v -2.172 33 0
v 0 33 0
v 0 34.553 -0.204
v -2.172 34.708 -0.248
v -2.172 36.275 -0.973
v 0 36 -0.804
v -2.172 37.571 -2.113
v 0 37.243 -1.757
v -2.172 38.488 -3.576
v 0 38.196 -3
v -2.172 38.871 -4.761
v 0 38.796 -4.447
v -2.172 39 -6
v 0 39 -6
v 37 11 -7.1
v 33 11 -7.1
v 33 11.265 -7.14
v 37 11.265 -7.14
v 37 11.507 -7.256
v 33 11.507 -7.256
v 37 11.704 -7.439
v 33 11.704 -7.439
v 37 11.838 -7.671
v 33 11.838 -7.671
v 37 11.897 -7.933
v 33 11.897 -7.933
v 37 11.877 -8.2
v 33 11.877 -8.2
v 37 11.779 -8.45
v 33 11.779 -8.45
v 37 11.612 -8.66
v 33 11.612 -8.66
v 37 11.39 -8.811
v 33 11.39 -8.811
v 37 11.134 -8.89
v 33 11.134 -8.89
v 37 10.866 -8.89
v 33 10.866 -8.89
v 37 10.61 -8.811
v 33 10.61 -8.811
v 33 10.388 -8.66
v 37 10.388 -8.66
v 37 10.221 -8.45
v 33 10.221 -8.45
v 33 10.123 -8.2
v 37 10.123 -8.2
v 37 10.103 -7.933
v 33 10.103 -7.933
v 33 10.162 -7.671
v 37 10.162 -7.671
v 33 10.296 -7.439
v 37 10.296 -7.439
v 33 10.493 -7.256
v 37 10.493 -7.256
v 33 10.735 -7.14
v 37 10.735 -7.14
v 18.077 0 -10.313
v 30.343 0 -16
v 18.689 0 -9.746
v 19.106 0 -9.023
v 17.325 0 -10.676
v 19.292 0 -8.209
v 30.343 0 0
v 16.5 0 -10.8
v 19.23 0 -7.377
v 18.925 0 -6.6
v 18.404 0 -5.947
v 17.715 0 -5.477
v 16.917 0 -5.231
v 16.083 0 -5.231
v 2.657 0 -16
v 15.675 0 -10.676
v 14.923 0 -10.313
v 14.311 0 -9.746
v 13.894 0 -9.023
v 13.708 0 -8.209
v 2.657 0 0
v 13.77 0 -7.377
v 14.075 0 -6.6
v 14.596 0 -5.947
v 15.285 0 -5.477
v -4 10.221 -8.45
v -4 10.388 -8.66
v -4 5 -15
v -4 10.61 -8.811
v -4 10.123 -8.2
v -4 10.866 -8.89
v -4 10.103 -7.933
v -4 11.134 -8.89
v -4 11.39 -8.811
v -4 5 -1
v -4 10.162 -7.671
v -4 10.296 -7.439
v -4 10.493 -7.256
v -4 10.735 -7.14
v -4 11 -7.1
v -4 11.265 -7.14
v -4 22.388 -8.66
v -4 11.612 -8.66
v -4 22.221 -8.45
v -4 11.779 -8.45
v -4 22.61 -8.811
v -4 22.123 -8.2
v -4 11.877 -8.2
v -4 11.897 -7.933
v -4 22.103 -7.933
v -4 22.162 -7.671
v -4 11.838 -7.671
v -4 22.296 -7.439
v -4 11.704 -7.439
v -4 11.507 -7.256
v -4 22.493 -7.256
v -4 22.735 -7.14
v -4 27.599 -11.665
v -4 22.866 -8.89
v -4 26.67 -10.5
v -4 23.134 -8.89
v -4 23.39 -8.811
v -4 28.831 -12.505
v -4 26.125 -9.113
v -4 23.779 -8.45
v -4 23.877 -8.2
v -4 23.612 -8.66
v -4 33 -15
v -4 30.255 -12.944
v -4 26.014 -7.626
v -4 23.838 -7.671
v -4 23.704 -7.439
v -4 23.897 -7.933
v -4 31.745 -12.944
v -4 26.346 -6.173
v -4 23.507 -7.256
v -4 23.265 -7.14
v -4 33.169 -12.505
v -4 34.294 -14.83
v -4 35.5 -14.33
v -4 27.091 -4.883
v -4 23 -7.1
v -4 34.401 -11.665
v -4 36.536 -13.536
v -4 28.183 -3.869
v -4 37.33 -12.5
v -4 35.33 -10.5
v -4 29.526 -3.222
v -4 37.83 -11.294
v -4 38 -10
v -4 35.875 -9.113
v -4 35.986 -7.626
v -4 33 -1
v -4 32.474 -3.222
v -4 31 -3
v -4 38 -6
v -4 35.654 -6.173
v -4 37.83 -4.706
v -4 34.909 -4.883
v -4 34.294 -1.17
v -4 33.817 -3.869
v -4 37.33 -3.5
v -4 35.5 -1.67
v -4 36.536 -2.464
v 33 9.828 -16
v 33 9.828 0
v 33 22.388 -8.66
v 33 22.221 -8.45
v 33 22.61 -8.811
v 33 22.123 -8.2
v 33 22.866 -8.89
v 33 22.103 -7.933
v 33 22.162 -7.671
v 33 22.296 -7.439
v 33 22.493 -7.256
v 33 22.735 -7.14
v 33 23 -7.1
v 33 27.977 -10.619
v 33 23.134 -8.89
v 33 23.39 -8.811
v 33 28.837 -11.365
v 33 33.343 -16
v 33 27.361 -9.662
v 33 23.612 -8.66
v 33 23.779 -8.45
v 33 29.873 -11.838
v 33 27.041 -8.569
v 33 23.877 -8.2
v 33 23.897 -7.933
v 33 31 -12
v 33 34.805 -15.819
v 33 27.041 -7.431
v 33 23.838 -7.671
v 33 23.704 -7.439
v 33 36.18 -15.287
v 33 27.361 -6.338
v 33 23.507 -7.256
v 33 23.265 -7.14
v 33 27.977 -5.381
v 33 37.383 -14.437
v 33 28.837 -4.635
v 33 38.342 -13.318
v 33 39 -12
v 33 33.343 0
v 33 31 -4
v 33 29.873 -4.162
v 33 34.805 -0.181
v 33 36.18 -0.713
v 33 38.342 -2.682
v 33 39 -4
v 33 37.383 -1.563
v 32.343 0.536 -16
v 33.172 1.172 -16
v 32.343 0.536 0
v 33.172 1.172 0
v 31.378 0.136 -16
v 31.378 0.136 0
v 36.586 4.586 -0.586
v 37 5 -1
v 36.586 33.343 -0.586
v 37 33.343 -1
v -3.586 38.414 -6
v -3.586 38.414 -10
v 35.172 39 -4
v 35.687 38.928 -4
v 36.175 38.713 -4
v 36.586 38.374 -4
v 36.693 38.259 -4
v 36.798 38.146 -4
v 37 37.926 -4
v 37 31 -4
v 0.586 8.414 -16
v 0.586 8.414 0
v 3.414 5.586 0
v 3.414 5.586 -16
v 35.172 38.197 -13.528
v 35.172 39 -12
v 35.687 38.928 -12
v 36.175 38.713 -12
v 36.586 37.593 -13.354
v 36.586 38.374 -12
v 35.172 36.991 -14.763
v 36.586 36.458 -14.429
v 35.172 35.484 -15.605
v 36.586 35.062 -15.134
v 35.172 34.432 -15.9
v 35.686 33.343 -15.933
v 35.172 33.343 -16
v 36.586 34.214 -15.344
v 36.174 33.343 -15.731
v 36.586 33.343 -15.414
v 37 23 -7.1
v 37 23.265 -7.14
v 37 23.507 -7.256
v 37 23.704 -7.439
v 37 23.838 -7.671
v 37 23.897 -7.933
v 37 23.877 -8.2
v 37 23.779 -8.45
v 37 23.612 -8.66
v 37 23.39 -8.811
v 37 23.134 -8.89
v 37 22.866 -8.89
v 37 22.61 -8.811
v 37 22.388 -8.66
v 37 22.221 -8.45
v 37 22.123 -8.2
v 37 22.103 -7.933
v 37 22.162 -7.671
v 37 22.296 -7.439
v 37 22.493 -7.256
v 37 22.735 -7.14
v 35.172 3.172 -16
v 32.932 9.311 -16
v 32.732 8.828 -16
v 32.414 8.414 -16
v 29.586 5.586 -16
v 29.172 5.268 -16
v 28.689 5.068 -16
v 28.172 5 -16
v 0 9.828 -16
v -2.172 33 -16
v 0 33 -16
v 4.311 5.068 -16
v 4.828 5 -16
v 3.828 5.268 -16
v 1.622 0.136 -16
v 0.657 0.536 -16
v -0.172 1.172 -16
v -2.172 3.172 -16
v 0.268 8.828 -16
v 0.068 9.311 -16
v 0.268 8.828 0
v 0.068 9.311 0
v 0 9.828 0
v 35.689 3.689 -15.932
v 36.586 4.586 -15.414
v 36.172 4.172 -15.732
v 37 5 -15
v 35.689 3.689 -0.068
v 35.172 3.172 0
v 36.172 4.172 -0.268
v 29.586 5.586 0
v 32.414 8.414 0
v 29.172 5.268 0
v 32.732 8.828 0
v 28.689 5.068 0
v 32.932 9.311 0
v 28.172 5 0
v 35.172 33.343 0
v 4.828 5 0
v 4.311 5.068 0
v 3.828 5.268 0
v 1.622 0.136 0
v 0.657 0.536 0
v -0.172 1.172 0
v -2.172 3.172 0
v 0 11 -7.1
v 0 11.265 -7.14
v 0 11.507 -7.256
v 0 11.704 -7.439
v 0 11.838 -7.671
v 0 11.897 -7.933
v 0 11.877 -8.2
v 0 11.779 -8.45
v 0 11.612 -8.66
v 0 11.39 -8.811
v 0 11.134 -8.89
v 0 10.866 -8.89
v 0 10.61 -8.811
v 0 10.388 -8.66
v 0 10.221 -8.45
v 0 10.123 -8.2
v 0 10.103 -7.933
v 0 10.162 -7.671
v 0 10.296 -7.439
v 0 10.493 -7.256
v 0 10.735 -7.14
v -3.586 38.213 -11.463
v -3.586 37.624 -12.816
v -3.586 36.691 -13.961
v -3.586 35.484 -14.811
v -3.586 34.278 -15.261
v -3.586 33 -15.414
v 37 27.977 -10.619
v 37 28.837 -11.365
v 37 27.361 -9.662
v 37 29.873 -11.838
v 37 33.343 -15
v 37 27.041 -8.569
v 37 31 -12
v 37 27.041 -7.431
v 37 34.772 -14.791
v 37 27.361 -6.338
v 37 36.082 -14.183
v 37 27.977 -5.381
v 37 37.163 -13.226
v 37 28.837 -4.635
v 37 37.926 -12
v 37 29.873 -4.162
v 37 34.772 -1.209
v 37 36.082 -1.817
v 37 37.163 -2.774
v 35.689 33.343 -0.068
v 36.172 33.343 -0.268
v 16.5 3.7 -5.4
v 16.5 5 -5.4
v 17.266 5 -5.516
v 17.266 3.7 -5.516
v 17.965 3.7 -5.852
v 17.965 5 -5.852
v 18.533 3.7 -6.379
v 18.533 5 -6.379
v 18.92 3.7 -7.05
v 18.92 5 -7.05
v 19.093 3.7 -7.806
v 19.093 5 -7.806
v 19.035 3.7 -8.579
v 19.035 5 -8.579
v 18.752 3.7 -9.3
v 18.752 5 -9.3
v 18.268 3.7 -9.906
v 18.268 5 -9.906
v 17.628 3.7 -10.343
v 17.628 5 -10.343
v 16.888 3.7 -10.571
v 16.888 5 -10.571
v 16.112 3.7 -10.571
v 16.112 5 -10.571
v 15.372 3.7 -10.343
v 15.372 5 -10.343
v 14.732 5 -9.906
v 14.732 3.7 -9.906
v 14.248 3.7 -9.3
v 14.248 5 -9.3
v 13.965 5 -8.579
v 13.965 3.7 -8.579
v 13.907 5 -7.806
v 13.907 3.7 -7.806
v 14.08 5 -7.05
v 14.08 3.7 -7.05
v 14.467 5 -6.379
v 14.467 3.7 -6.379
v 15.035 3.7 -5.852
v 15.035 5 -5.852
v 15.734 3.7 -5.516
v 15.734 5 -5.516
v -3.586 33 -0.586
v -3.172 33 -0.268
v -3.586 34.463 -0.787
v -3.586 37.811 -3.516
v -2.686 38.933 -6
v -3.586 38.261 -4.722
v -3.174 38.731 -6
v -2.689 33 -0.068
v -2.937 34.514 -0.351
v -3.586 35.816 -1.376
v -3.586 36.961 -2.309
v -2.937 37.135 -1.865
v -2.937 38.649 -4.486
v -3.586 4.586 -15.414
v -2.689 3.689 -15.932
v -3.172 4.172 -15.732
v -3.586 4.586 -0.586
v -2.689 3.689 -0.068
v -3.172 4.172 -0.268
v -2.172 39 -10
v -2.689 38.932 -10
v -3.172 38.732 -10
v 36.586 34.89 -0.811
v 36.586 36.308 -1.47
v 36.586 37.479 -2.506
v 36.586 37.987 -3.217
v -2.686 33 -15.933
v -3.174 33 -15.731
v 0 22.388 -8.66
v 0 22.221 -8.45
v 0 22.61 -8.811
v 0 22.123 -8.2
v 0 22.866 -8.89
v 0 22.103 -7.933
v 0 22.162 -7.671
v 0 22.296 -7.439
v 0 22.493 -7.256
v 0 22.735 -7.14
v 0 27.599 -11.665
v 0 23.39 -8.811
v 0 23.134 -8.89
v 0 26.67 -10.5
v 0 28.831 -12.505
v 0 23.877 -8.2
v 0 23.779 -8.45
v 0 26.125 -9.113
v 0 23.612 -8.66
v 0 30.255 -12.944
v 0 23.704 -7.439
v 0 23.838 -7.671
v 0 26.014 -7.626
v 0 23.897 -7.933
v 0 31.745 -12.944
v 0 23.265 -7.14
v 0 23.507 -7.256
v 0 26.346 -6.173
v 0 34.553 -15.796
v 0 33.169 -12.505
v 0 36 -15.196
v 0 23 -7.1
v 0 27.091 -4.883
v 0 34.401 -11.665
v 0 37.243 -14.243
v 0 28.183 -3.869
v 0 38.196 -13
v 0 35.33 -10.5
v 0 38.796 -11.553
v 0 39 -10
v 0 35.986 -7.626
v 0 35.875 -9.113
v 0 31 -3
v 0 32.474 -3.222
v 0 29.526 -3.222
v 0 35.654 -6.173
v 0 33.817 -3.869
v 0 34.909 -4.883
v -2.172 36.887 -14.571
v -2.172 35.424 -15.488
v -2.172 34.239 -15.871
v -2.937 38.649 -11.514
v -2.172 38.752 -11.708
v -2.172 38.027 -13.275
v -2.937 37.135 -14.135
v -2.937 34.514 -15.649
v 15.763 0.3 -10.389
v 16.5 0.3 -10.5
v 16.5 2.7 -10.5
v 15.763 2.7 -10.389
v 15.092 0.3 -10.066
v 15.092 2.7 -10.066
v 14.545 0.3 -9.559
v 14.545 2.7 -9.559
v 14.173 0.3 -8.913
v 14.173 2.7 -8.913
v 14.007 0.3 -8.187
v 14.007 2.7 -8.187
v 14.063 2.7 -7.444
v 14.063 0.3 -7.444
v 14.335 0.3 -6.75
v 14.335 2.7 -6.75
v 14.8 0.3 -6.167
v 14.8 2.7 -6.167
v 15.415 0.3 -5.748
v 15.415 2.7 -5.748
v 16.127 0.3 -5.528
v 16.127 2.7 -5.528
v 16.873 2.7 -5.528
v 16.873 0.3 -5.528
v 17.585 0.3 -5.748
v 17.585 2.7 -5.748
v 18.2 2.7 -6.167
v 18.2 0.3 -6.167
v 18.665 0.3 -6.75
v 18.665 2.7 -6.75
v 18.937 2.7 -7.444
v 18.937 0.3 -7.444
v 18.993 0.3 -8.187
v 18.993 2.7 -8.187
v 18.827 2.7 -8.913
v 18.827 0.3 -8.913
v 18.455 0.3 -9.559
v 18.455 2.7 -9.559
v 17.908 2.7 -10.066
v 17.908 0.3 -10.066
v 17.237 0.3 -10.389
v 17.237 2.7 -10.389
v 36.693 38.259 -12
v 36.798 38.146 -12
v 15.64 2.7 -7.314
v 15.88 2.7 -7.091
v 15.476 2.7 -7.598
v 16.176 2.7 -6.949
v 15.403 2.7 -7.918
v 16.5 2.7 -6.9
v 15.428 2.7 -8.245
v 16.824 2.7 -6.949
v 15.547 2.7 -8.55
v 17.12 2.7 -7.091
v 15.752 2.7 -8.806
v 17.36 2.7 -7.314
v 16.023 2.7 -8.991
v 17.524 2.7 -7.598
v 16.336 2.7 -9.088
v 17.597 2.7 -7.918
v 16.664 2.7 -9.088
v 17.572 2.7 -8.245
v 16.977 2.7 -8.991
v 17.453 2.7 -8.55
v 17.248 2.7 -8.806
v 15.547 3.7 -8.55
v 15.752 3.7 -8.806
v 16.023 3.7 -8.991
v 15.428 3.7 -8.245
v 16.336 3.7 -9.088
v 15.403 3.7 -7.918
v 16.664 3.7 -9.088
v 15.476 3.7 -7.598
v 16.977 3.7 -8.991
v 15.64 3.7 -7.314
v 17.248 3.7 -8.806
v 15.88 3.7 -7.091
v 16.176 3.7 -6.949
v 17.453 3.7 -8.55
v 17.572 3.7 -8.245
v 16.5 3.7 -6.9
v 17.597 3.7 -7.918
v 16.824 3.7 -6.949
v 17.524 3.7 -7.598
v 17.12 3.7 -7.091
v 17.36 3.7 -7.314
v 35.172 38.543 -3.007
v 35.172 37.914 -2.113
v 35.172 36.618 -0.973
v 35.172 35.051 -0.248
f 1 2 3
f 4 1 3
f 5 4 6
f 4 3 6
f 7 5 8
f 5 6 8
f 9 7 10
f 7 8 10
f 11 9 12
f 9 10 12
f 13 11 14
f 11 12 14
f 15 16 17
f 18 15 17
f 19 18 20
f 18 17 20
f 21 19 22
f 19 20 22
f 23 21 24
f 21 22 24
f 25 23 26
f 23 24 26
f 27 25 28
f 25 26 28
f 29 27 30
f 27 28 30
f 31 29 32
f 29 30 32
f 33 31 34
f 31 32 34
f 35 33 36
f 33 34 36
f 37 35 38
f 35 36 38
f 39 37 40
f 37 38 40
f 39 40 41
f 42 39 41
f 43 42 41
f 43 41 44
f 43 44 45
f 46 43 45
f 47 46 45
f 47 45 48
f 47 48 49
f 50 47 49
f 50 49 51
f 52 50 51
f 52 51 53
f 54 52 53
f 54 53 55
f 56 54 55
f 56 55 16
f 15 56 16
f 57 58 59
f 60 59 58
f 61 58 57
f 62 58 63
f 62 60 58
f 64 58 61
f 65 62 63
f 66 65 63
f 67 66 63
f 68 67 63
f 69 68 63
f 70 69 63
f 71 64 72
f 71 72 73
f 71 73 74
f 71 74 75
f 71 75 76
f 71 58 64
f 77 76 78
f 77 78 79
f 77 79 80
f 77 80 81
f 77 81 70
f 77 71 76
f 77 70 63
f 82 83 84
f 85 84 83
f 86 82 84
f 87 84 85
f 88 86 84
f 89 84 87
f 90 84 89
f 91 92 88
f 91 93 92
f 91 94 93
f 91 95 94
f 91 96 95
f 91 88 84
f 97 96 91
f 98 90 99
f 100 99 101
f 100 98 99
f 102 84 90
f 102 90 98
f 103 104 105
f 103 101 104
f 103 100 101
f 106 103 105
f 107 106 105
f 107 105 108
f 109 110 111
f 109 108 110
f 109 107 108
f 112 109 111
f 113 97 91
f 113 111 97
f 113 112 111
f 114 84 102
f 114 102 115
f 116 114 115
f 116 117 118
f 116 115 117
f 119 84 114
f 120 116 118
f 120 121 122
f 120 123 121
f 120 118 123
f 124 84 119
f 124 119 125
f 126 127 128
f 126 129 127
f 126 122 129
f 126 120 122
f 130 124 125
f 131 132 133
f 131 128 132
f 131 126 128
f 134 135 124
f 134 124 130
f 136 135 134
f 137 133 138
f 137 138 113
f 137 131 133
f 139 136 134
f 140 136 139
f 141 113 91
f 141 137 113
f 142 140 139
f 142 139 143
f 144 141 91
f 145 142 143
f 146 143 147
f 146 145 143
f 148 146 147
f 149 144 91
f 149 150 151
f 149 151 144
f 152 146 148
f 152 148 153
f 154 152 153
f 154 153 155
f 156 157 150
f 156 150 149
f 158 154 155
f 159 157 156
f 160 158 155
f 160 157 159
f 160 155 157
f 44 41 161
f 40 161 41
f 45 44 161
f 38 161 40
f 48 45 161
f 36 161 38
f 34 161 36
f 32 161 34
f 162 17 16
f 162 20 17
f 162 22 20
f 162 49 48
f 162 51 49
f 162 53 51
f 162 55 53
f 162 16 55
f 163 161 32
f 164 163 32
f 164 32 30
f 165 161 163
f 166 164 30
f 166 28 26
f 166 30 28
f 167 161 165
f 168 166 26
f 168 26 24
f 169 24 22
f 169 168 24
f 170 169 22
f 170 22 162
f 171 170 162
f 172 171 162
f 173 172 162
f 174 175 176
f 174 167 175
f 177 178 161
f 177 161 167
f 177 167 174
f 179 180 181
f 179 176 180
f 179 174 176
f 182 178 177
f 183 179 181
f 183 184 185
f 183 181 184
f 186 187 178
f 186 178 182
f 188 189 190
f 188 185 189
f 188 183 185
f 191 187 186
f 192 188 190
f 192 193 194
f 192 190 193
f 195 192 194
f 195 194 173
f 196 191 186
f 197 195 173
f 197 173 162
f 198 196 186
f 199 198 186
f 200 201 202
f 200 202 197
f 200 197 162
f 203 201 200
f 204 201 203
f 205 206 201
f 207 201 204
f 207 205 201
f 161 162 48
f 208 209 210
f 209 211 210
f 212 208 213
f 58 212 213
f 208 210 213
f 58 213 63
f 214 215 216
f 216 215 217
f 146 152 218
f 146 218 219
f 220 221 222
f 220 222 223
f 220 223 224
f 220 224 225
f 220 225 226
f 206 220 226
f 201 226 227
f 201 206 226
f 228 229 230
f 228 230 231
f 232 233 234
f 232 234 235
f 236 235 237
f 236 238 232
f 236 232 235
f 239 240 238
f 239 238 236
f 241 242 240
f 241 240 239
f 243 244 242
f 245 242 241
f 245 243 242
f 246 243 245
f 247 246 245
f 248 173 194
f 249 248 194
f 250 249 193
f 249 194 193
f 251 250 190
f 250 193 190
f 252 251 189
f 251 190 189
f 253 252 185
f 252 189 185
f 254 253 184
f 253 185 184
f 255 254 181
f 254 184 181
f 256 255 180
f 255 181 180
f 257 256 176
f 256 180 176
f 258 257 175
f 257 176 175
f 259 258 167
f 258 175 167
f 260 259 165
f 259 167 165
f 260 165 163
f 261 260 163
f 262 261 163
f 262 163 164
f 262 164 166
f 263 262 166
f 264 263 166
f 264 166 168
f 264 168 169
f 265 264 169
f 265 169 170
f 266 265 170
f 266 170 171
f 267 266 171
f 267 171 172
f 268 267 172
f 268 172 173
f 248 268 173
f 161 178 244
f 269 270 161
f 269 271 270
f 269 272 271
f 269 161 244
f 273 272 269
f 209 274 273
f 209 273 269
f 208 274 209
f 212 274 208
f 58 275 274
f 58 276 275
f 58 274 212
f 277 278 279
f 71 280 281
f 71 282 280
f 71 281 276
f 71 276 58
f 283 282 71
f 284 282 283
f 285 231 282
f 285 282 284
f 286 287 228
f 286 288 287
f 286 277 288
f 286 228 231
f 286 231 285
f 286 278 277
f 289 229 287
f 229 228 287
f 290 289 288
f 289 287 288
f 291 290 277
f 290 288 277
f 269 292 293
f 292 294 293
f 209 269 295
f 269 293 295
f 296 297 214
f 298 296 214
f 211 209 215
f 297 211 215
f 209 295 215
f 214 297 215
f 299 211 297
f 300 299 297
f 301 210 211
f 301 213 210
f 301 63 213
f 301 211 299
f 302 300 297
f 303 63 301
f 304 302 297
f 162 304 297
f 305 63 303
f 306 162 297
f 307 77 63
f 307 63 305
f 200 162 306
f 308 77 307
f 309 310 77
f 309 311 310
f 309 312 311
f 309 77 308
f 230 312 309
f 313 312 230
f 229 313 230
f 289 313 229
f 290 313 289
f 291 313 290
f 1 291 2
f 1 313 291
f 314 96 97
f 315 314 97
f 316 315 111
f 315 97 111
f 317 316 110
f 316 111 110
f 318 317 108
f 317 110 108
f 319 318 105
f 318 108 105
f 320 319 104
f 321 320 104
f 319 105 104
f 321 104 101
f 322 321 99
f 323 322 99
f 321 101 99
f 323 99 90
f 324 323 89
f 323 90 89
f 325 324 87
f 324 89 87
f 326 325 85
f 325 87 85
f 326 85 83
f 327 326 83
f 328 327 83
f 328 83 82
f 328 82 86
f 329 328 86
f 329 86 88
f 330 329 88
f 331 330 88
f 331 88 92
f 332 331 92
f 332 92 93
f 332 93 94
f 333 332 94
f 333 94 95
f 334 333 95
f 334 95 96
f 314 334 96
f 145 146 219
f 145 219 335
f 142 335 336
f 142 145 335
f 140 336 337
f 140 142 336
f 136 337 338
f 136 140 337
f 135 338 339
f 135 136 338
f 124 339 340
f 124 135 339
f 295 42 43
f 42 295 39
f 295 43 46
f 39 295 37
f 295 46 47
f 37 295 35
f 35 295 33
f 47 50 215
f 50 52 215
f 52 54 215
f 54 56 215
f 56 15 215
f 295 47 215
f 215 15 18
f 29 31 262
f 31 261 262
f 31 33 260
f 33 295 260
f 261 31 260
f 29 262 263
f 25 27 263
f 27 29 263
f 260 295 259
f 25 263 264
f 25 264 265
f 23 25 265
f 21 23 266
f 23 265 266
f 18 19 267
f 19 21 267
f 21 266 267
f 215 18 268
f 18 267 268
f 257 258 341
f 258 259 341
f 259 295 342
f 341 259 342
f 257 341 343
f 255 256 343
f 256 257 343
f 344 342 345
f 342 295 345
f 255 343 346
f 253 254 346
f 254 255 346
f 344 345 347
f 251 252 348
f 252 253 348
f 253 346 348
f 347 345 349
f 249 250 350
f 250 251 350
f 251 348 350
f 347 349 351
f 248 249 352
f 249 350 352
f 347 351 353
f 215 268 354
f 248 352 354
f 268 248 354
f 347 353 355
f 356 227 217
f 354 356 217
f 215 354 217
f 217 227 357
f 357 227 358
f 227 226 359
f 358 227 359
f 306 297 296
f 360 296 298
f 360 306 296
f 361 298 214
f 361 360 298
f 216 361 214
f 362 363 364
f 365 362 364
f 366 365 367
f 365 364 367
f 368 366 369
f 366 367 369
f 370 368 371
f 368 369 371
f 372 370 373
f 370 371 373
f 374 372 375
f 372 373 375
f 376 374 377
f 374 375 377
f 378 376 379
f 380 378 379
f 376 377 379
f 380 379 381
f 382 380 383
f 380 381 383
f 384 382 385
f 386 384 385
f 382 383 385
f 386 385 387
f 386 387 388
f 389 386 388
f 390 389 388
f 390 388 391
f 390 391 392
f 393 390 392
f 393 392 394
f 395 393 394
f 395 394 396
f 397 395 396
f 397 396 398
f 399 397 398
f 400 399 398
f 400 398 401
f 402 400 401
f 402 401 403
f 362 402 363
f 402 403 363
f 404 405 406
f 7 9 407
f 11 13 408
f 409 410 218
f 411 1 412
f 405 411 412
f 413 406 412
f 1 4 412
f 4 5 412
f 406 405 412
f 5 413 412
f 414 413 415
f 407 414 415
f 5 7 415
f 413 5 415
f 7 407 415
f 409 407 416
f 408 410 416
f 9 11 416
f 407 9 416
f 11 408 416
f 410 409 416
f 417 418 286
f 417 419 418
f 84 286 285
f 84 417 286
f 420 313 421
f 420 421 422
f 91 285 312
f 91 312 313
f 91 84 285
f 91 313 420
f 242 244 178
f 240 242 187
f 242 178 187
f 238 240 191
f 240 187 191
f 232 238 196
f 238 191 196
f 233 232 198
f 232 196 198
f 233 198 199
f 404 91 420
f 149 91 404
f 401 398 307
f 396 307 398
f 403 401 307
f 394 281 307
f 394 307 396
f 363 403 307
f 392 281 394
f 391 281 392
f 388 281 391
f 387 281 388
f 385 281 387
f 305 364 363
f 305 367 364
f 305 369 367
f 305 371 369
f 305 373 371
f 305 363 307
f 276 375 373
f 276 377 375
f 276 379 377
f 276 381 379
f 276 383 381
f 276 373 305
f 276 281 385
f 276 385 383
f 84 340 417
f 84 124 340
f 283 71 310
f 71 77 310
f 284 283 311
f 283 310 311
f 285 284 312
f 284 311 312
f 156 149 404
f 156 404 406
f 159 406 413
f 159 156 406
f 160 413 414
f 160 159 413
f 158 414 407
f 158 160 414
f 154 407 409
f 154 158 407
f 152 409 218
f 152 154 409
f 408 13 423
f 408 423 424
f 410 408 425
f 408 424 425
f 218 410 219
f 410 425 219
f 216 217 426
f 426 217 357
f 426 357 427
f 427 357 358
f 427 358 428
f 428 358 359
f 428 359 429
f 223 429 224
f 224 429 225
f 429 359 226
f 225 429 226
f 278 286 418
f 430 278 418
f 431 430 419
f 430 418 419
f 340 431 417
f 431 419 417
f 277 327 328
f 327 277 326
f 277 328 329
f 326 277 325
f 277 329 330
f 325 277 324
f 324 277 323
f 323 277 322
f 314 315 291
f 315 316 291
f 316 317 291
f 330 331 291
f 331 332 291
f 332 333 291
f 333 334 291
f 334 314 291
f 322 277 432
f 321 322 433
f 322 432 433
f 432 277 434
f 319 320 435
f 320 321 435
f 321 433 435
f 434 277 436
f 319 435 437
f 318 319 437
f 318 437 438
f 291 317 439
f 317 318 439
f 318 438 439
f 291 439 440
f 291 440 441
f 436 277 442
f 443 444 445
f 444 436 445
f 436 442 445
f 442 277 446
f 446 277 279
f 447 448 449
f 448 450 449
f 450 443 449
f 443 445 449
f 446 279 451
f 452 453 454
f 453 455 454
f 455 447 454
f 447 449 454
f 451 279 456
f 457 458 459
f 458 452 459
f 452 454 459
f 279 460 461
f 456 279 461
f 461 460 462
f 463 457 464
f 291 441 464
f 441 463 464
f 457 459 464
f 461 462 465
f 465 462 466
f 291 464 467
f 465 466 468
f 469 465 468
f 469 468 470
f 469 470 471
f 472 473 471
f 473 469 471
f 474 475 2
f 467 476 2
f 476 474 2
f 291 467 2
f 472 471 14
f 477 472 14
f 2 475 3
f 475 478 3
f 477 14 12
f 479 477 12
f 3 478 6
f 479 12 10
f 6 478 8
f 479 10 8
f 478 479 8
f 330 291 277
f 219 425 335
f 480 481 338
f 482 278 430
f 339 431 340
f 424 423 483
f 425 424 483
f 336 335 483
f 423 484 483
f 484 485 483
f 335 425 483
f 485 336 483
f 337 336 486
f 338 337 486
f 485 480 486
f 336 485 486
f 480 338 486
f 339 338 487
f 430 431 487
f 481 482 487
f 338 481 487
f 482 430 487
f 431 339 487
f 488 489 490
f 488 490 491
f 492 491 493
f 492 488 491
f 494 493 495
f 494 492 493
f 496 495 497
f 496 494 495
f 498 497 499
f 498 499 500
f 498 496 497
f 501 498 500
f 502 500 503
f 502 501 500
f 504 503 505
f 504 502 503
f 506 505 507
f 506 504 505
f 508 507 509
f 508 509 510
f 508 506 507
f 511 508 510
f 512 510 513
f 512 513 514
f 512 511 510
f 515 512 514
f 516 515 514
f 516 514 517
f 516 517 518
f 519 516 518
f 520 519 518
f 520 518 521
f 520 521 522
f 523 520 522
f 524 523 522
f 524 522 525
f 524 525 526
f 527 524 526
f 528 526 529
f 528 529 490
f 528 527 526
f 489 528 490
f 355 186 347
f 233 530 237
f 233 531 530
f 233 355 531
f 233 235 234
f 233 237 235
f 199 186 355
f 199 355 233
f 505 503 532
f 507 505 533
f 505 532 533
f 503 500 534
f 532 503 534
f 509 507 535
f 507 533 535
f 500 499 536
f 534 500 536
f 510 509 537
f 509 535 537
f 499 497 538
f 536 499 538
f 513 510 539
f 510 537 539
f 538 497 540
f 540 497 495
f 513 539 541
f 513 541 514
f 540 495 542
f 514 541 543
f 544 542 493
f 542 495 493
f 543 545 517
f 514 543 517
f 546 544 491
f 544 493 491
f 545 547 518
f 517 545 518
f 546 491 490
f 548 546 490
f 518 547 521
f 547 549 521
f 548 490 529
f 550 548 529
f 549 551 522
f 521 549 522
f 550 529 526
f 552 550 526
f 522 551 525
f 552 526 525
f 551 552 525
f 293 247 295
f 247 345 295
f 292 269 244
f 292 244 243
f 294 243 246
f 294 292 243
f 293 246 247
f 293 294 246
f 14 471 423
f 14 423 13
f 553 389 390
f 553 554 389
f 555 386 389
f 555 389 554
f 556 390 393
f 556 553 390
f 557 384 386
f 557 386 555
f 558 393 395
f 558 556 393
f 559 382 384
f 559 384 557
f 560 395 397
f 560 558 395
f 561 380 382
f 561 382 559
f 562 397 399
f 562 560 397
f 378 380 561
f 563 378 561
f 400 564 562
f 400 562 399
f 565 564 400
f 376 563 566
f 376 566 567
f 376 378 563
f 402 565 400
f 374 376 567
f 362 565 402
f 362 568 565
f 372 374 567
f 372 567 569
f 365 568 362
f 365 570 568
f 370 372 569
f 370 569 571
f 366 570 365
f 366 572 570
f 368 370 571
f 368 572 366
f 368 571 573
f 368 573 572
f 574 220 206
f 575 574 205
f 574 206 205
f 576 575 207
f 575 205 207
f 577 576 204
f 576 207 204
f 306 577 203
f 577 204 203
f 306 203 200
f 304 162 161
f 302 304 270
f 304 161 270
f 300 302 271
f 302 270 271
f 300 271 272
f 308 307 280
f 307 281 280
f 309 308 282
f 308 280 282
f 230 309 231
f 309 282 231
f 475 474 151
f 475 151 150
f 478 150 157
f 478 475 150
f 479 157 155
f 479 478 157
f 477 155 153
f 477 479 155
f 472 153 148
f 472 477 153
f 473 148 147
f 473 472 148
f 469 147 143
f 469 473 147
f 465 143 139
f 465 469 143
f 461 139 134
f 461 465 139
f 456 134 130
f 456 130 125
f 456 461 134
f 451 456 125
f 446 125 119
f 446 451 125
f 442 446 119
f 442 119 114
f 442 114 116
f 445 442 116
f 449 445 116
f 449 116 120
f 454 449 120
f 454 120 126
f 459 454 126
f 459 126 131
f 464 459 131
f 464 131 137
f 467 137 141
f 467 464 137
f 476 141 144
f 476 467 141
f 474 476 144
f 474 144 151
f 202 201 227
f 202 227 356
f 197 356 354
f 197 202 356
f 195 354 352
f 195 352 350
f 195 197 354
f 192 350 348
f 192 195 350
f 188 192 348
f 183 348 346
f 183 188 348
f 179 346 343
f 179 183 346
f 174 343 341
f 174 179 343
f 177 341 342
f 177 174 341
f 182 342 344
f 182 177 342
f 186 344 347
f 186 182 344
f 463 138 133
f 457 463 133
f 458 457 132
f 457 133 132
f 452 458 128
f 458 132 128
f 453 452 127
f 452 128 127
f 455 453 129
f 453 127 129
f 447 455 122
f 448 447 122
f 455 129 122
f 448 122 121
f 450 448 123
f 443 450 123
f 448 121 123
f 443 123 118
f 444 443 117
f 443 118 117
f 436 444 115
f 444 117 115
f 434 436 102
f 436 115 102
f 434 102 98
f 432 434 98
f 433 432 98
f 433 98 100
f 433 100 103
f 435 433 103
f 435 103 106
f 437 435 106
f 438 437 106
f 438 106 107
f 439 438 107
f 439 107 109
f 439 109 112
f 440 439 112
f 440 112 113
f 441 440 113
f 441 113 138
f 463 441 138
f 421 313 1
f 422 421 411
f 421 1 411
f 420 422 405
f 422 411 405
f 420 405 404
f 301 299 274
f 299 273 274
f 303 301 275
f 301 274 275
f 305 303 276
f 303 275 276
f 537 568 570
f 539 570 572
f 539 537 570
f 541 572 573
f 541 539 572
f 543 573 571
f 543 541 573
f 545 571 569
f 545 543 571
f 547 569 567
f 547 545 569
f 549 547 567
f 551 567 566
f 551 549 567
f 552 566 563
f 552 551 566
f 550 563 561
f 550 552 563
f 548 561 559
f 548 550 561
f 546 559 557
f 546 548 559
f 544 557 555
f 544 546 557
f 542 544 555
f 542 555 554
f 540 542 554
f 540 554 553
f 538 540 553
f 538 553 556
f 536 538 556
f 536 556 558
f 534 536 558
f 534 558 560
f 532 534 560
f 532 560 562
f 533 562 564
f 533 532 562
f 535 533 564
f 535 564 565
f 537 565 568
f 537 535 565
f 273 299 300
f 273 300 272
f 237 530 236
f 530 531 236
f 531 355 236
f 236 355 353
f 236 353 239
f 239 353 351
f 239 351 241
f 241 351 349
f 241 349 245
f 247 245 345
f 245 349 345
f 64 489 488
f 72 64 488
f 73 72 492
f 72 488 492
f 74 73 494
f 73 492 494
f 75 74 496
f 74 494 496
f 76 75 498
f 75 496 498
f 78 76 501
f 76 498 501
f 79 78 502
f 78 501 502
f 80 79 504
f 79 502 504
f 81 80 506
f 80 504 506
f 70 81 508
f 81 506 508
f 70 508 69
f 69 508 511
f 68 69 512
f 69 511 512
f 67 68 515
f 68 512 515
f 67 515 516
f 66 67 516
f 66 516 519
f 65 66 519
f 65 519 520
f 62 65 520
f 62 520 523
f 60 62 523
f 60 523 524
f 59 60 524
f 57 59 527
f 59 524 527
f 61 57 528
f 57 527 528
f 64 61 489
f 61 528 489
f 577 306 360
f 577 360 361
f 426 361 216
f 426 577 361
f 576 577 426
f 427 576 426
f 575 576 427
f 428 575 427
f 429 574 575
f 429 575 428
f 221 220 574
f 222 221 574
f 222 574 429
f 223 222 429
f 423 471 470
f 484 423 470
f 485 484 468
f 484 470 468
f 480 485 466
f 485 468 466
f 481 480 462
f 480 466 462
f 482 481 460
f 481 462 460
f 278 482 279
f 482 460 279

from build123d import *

# Parameters (mm, degrees)
SKETCH1_W           = 33
SKETCH1_H           = 16
SKETCH1_R           = 2.5
BOSS_EXTRUDE1_DEPTH = 2.7
SKETCH2_W           = 33
SKETCH2_H           = 16
SKETCH2_R           = 1.1
BOSS_EXTRUDE2_DEPTH = 2.3
SKETCH4_W           = 16
SKETCH4_H           = 39
SKETCH4_R           = 5
BOSS_EXTRUDE3_DEPTH = 4
BOSS_EXTRUDE4_DEPTH = 4
FILLET1_R           = 6
CHAMFER1_SIZE       = 4
SKETCH6_R           = 0.9
CUT_EXTRUDE1_DEPTH  = 59.804761712
CHAMFER2_SIZE       = 1
FILLET3_R           = 2
SKETCH7_R           = 2.6
CUT_EXTRUDE2_DEPTH  = 1.3
FILLET4_R           = 2
CHAMFER3_SIZE       = 5
FILLET7_R           = 4
CHAMFER4_SIZE       = 0.3


with BuildPart() as part:
    # Sketch1 → Boss-Extrude1 (new body)
    with BuildSketch(Plane(origin=(0, 0, 0), x_dir=(1, 0, 0), z_dir=(0, 1, 0))):
        with Locations((16.5, 8)):
            Rectangle(SKETCH1_W, SKETCH1_H)
        with Locations(Location((16.5, 8, 0), (0, 0, 90))):
            Circle(SKETCH1_R, mode=Mode.SUBTRACT)
    extrude(amount=BOSS_EXTRUDE1_DEPTH)

    # Sketch2 → Boss-Extrude2 (add)
    with BuildSketch(Plane(origin=(0, 2.7, 0), x_dir=(1, 0, 0), z_dir=(0, 1, 0))):
        with Locations((16.5, 8)):
            Rectangle(SKETCH2_W, SKETCH2_H)
        with Locations(Location((16.5, 8, 0), (0, 0, 270))):
            Circle(SKETCH2_R, mode=Mode.SUBTRACT)
    extrude(amount=BOSS_EXTRUDE2_DEPTH)

    # Sketch4 → Boss-Extrude3 (add)
    with BuildSketch(Plane.ZY):
        with Locations((-8, 19.5)):
            Rectangle(SKETCH4_W, SKETCH4_H)
        with Locations((-8, 31)):
            Circle(SKETCH4_R, mode=Mode.SUBTRACT)
    extrude(amount=BOSS_EXTRUDE3_DEPTH)

    # Sketch5 → Boss-Extrude4 (add)
    with BuildSketch(Plane(origin=(33, 0, 0), x_dir=(0, 0, -1), z_dir=(1, 0, 0))):
        with BuildLine():
            Line((0, 39), (4, 39))
            Line((4, 39), (4, 31))
            ThreePointArc((4, 31), (8, 27), (12, 31))
            Line((12, 31), (12, 39))
            Line((12, 39), (16, 39))
            Line((16, 39), (16, 0))
            Line((16, 0), (0, 0))
            Line((0, 0), (0, 39))
        make_face()
    extrude(amount=BOSS_EXTRUDE4_DEPTH)

    # Fillet1
    # the kernel refuses this fillet: 6 mm, written as the material it takes off along each edge
    with BuildSketch(Plane(origin=(18.857864376, 39, -16), x_dir=(0, -1, 0), z_dir=(1, 0, 0))) as fillet1_piece_1:
        with BuildLine():
            CenterArc((5.656854249, -6), FILLET1_R, 90, 70.528779366)
            Line((0, -4), (-0.113137085, -3.96))
            ThreePointArc((-0.113137085, -3.96), (-0.12, -2), (-0.12, 0))
            Line((-0.12, 0), (0, 0.12))
            Line((0, 0.12), (5.656854249, 0.12))
            Line((5.656854249, 0.12), (5.656854249, 0))
        make_face()
    extrude(amount=32.284271247, mode=Mode.SUBTRACT)
    with BuildSketch(Plane(origin=(15, 39, -16), x_dir=(0, -1, 0), z_dir=(-1, 0, 0))) as fillet1_piece_2:
        with BuildLine():
            CenterArc((FILLET1_R, FILLET1_R), FILLET1_R, 180, 90)
            Line((0, FILLET1_R), (-FILLET1_R * 0.02, FILLET1_R))
            Line((-FILLET1_R * 0.02, FILLET1_R), (-FILLET1_R * 0.02, -FILLET1_R * 0.02))
            Line((-FILLET1_R * 0.02, -FILLET1_R * 0.02), (FILLET1_R, -FILLET1_R * 0.02))
            Line((FILLET1_R, -FILLET1_R * 0.02), (FILLET1_R, 0))
        make_face()
    extrude(amount=34, mode=Mode.SUBTRACT)
    with BuildSketch(Plane(origin=(18.857864376, 39, 0), x_dir=(0, -1, 0), z_dir=(1, 0, 0))) as fillet1_piece_3:
        with BuildLine():
            CenterArc((5.656854249, 6), FILLET1_R, 199.471220634, 70.528779366)
            Line((0, 4), (-0.113137085, 3.96))
            ThreePointArc((-0.113137085, 3.96), (-0.12, 2), (-0.12, 0))
            Line((-0.12, 0), (0, -0.12))
            Line((0, -0.12), (5.656854249, -0.12))
            Line((5.656854249, -0.12), (5.656854249, 0))
        make_face()
    extrude(amount=32.284271247, mode=Mode.SUBTRACT)
    with BuildSketch(Plane(origin=(15, 39, 0), x_dir=(0, -1, 0), z_dir=(-1, 0, 0))) as fillet1_piece_4:
        with BuildLine():
            CenterArc((FILLET1_R, -FILLET1_R), FILLET1_R, 90, 90)
            Line((0, -FILLET1_R), (-FILLET1_R * 0.02, -FILLET1_R))
            Line((-FILLET1_R * 0.02, -FILLET1_R), (-FILLET1_R * 0.02, FILLET1_R * 0.02))
            Line((-FILLET1_R * 0.02, FILLET1_R * 0.02), (FILLET1_R, FILLET1_R * 0.02))
            Line((FILLET1_R, FILLET1_R * 0.02), (FILLET1_R, 0))
        make_face()
    extrude(amount=34, mode=Mode.SUBTRACT)

    # Chamfer1
    chamfer1_edges = [part.edges().sort_by_distance(p)[0] for p in [
        (0, 5, -8),
        (33, 5, -8),
    ]]
    chamfer(chamfer1_edges, length=CHAMFER1_SIZE)

    # Sketch6 → Cut-Extrude1 (cut, through all)
    with BuildSketch(Plane.ZY.offset(4)):
        with Locations((-8, 23)):
            Circle(SKETCH6_R)
        with Locations((-8, 11)):
            Circle(SKETCH6_R)
    extrude(amount=-CUT_EXTRUDE1_DEPTH, mode=Mode.SUBTRACT)

    # Chamfer2
    chamfer2_edges = [part.edges().sort_by_distance(p)[0] for p in [
        (-4, 16.5, 0),
        (37, 16.671572875, -16),
        (-4, 16.5, -16),
        (37, 16.671572875, 0),
        (37, 36.807247366, -1.101020514),
        (37, 36.807247366, -14.898979486),
        (-4, 39, -8),
        (-4, 37.242640687, -1.757359313),
        (-4, 37.242640687, -14.242640687),
    ]]
    chamfer(chamfer2_edges, length=CHAMFER2_SIZE)

    # Fillet3
    fillet3_edges = [part.edges().sort_by_distance(p)[0] for p in [
        (36, 16.671572875, -16),
        (36, 16.671572875, 0),
        (-3, 16.5, -16),
        (-3, 37.242640687, -14.242640687),
        (-3, 16.5, 0),
        (-3, 37.242640687, -1.757359313),
        (36, 36.807247366, -14.898979486),
        (36, 36.807247366, -1.101020514),
        (-3, 39, -8),
    ]]
    fillet(fillet3_edges, radius=FILLET3_R)

    # Sketch7 → Cut-Extrude2 (cut)
    with BuildSketch(Plane(origin=(0, 5, 0), x_dir=(1, 0, 0), z_dir=(0, 1, 0))):
        with Locations(Location((16.5, 8, 0), (0, 0, 270))):
            Circle(SKETCH7_R)
    extrude(amount=-CUT_EXTRUDE2_DEPTH, mode=Mode.SUBTRACT)

    # Fillet4
    fillet4_edges = [part.edges().sort_by_distance(p)[0] for p in [
        (29, 5, -8),
        (33, 9, -8),
        (0, 9, -8),
        (4, 5, -8),
    ]]
    fillet(fillet4_edges, radius=FILLET4_R)

    # Chamfer3
    chamfer3_edges = [part.edges().sort_by_distance(p)[0] for p in [
        (37, 0, -8),
        (-4, 0, -8),
    ]]
    chamfer(chamfer3_edges, length=CHAMFER3_SIZE)

    # Fillet7
    fillet7_edges = [part.edges().sort_by_distance(p)[0] for p in [
        (1, 0, -8),
        (32, 0, -8),
    ]]
    fillet(fillet7_edges, radius=FILLET7_R)

    # Chamfer4
    chamfer4_edges = [part.edges().sort_by_distance(p)[0] for p in [
        (16.5, 0, -5.5),
    ]]
    chamfer(chamfer4_edges, length=CHAMFER4_SIZE)


solid = part.part
